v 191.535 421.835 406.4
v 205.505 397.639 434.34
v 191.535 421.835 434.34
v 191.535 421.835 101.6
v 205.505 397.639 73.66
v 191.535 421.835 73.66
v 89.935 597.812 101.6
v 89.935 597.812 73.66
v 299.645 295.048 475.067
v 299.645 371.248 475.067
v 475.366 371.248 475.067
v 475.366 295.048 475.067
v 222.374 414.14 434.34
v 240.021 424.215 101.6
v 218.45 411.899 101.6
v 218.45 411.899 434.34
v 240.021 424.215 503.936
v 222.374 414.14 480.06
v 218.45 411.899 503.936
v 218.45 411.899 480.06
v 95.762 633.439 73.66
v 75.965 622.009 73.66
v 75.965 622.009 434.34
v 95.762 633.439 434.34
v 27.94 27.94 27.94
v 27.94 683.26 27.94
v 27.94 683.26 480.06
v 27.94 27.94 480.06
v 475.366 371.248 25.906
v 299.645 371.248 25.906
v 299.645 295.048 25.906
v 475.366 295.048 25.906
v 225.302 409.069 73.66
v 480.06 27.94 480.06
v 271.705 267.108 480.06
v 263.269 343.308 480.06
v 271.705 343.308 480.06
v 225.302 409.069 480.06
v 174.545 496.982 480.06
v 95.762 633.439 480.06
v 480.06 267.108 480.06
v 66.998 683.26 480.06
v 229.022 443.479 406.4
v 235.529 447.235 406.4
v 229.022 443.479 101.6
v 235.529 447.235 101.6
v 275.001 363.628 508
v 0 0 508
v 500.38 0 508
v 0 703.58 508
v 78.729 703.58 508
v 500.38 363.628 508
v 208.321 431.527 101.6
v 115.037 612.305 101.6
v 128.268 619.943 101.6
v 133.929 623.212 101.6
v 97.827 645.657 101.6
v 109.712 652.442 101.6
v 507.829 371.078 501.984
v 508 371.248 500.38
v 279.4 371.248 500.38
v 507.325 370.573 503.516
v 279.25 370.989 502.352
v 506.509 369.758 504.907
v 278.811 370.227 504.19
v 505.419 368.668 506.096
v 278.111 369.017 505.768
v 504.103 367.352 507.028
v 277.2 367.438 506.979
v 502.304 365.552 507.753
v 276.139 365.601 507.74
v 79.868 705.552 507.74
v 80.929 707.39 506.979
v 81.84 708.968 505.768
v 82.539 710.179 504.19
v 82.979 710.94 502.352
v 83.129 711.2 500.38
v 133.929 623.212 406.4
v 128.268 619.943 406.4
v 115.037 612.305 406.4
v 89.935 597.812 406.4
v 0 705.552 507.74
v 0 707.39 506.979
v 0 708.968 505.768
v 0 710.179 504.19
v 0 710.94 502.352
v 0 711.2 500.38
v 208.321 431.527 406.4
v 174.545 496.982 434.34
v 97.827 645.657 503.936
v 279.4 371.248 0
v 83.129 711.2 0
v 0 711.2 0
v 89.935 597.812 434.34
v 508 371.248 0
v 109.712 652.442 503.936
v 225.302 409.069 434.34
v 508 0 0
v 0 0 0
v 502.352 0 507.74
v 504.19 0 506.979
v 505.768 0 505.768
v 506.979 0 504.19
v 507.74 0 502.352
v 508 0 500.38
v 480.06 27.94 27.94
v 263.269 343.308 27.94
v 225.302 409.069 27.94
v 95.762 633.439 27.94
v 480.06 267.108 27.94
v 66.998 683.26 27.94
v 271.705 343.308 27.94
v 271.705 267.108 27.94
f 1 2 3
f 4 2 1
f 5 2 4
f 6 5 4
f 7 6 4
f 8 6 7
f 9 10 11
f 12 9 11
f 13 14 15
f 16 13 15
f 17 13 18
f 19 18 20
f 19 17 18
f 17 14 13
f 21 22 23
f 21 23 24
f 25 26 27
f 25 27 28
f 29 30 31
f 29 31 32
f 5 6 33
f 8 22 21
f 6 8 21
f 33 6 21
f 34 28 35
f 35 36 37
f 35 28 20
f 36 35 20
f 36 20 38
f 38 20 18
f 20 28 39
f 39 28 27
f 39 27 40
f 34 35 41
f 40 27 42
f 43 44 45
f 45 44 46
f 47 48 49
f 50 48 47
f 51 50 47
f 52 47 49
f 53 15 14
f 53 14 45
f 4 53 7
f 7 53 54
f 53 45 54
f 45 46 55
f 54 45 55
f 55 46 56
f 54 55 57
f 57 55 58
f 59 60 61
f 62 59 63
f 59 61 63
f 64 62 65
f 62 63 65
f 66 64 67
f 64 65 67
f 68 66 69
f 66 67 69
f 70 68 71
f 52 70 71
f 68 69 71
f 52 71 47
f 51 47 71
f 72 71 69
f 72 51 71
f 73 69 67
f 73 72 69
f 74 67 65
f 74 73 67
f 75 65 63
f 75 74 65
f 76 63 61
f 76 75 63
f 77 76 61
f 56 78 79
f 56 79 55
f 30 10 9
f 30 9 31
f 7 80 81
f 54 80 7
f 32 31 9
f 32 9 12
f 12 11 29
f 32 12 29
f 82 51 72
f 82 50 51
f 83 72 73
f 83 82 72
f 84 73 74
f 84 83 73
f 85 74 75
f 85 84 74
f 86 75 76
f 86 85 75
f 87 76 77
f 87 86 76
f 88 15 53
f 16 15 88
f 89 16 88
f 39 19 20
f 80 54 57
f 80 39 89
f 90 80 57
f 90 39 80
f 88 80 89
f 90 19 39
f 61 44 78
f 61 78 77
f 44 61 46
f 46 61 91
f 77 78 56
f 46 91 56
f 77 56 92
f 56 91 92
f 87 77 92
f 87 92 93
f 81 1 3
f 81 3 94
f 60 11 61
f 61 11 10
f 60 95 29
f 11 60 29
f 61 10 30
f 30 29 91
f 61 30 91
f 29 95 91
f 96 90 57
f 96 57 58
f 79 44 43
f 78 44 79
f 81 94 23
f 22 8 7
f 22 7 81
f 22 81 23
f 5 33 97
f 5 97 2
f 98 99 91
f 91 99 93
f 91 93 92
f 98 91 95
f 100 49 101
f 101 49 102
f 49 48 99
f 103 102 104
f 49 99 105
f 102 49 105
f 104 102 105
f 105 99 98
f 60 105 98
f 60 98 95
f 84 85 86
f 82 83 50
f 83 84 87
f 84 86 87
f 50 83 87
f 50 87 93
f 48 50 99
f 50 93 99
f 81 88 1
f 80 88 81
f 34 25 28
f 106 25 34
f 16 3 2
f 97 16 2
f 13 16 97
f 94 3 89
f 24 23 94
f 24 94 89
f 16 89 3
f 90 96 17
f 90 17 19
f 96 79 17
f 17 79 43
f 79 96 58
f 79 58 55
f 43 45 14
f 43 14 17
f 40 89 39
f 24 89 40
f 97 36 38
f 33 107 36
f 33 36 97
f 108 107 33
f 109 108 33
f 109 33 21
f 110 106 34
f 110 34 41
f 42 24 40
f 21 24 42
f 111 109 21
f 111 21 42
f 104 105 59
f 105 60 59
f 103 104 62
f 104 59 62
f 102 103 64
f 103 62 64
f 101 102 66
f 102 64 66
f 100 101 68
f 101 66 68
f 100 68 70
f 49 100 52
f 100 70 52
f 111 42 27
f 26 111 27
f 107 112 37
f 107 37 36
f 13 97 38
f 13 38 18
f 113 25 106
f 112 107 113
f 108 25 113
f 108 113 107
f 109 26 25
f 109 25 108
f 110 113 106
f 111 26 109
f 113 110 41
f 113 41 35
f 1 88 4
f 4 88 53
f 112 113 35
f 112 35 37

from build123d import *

# Parameters (mm, degrees)
BOSS_EXTRUDE1_DEPTH            = 508
SKETCH2_W                      = 175.72130466
SKETCH2_H                      = 449.160798253
CUT_EXTRUDE1_DEPTH             = 76.2
SKETCH3_W                      = 304.8
SKETCH3_H                      = 203.2
CUT_EXTRUDE3_DEPTH             = 50.8
SHELL2_START                   = 27.94
SHELL2_DEPTH                   = 452.12
SHELL2_2_DEPTH                 = 45.72
SHELL2_START_2                 = 434.34
SHELL2_3_DEPTH                 = 45.72
FILLET1_R                      = 7.62
CUT_EXTRUDE4_REACH             = 965.862
CUT_EXTRUDE4_DIRECTION_2_DEPTH = 97.536


# Read off the part's stored shape, not the designer's step: Shell2
with BuildPart() as part:
    # Sketch1 → Boss-Extrude1 (new body)
    with BuildSketch(Plane.XY):
        Polygon((508, 0), (508, 371.248348728), (279.4, 371.248348728), (83.128822626, 711.2), (0, 711.2), (0, 0), align=None)
    extrude(amount=BOSS_EXTRUDE1_DEPTH)

    # Sketch2 → Cut-Extrude1 (cut)
    with BuildSketch(Plane(origin=(0, 371.248348728, 0), x_dir=(1, 0, 0), z_dir=(0, 1, 0))):
        with Locations((387.505332687, -250.48614125)):
            Rectangle(SKETCH2_W, SKETCH2_H)
    extrude(amount=-CUT_EXTRUDE1_DEPTH, mode=Mode.SUBTRACT)

    # Sketch3 → Cut-Extrude3 (cut)
    with BuildSketch(Plane(origin=(370.305250556, 213.795836091, 0), x_dir=(0, 0, -1), z_dir=(0.8660254037844397, 0.49999999999999806, 0))):
        with Locations((-254, 371.152855858)):
            Rectangle(SKETCH3_W, SKETCH3_H)
    extrude(amount=-CUT_EXTRUDE3_DEPTH, mode=Mode.SUBTRACT)

    # Shell2 outline → Shell2 (cut)
    with BuildSketch(Plane.XY.offset(SHELL2_START)):
        Polygon((27.94, 27.94), (480.06, 27.94), (480.06, 267.108348728), (271.704680357, 267.108348728), (271.704680357, 343.308348728), (263.268833479, 343.308348728), (225.302072845, 409.068707145), (205.504732114, 397.638707145), (191.534732114, 421.835456927), (89.934732114, 597.811818976), (75.964732114, 622.008568757), (95.762072845, 633.438568757), (66.997656105, 683.26), (27.94, 683.26), align=None)
    extrude(amount=SHELL2_DEPTH, mode=Mode.SUBTRACT)

    # Shell2 2 outline → Shell2 2 (cut)
    with BuildSketch(Plane.XY.offset(SHELL2_START)):
        Polygon((225.302072845, 409.068707145), (95.762072845, 633.438568757), (75.964732114, 622.008568757), (89.934732114, 597.811818976), (191.534732114, 421.835456927), (205.504732114, 397.638707145), align=None)
    extrude(amount=SHELL2_2_DEPTH, mode=Mode.SUBTRACT)

    # Shell2 3 outline → Shell2 3 (cut)
    with BuildSketch(Plane.XY.offset(SHELL2_START_2)):
        Polygon((225.302072845, 409.068707145), (95.762072845, 633.438568757), (75.964732114, 622.008568757), (89.934732114, 597.811818976), (191.534732114, 421.835456927), (205.504732114, 397.638707145), align=None)
    extrude(amount=SHELL2_3_DEPTH, mode=Mode.SUBTRACT)

    # Fillet1
    fillet1_edges = [part.edges().sort_by_distance(p)[0] for p in [
        (393.7, 371.248348728, 508),
        (181.264411313, 541.224174364, 508),
        (41.564411313, 711.2, 508),
        (508, 185.624174364, 508),
    ]]
    fillet(fillet1_edges, radius=FILLET1_R)

    # Cut-Extrude4: up to this face of the body (flat: up to its plane)
    cut_extrude4_end = Plane(part.part.faces().sort_by_distance((162.73177737, 522.523637951, 101.6))[0])
    # Sketch6 → Cut-Extrude4 (cut, up to the picked face)
    with BuildSketch(Plane(origin=(0, 0, 406.4), x_dir=(-1, 0, 0), z_dir=(0, 0, -1)), mode=Mode.PRIVATE) as cut_extrude4_sk1:
        Polygon((-109.711824261, 652.442307464), (-240.02087993, 424.214985446), (-218.44952186, 411.898566558), (-97.827125151, 645.656599669), align=None)
    cut_extrude4_tool1 = split(extrude(cut_extrude4_sk1.sketch, amount=CUT_EXTRUDE4_REACH, mode=Mode.PRIVATE), bisect_by=cut_extrude4_end, keep=Keep.BOTH, mode=Mode.PRIVATE)
    add(cut_extrude4_tool1.solids().sort_by(Axis((172.556766, 522.406417, 406.4), (0, 0, -1)))[0], mode=Mode.SUBTRACT)

    # Sketch6 → Cut-Extrude4 direction 2 (cut)
    with BuildSketch(Plane(origin=(0, 0, 406.4), x_dir=(-1, 0, 0), z_dir=(0, 0, -1))):
        Polygon((-109.711824261, 652.442307464), (-240.02087993, 424.214985446), (-218.44952186, 411.898566558), (-97.827125151, 645.656599669), align=None)
    extrude(amount=-CUT_EXTRUDE4_DIRECTION_2_DEPTH, mode=Mode.SUBTRACT)


solid = part.part
